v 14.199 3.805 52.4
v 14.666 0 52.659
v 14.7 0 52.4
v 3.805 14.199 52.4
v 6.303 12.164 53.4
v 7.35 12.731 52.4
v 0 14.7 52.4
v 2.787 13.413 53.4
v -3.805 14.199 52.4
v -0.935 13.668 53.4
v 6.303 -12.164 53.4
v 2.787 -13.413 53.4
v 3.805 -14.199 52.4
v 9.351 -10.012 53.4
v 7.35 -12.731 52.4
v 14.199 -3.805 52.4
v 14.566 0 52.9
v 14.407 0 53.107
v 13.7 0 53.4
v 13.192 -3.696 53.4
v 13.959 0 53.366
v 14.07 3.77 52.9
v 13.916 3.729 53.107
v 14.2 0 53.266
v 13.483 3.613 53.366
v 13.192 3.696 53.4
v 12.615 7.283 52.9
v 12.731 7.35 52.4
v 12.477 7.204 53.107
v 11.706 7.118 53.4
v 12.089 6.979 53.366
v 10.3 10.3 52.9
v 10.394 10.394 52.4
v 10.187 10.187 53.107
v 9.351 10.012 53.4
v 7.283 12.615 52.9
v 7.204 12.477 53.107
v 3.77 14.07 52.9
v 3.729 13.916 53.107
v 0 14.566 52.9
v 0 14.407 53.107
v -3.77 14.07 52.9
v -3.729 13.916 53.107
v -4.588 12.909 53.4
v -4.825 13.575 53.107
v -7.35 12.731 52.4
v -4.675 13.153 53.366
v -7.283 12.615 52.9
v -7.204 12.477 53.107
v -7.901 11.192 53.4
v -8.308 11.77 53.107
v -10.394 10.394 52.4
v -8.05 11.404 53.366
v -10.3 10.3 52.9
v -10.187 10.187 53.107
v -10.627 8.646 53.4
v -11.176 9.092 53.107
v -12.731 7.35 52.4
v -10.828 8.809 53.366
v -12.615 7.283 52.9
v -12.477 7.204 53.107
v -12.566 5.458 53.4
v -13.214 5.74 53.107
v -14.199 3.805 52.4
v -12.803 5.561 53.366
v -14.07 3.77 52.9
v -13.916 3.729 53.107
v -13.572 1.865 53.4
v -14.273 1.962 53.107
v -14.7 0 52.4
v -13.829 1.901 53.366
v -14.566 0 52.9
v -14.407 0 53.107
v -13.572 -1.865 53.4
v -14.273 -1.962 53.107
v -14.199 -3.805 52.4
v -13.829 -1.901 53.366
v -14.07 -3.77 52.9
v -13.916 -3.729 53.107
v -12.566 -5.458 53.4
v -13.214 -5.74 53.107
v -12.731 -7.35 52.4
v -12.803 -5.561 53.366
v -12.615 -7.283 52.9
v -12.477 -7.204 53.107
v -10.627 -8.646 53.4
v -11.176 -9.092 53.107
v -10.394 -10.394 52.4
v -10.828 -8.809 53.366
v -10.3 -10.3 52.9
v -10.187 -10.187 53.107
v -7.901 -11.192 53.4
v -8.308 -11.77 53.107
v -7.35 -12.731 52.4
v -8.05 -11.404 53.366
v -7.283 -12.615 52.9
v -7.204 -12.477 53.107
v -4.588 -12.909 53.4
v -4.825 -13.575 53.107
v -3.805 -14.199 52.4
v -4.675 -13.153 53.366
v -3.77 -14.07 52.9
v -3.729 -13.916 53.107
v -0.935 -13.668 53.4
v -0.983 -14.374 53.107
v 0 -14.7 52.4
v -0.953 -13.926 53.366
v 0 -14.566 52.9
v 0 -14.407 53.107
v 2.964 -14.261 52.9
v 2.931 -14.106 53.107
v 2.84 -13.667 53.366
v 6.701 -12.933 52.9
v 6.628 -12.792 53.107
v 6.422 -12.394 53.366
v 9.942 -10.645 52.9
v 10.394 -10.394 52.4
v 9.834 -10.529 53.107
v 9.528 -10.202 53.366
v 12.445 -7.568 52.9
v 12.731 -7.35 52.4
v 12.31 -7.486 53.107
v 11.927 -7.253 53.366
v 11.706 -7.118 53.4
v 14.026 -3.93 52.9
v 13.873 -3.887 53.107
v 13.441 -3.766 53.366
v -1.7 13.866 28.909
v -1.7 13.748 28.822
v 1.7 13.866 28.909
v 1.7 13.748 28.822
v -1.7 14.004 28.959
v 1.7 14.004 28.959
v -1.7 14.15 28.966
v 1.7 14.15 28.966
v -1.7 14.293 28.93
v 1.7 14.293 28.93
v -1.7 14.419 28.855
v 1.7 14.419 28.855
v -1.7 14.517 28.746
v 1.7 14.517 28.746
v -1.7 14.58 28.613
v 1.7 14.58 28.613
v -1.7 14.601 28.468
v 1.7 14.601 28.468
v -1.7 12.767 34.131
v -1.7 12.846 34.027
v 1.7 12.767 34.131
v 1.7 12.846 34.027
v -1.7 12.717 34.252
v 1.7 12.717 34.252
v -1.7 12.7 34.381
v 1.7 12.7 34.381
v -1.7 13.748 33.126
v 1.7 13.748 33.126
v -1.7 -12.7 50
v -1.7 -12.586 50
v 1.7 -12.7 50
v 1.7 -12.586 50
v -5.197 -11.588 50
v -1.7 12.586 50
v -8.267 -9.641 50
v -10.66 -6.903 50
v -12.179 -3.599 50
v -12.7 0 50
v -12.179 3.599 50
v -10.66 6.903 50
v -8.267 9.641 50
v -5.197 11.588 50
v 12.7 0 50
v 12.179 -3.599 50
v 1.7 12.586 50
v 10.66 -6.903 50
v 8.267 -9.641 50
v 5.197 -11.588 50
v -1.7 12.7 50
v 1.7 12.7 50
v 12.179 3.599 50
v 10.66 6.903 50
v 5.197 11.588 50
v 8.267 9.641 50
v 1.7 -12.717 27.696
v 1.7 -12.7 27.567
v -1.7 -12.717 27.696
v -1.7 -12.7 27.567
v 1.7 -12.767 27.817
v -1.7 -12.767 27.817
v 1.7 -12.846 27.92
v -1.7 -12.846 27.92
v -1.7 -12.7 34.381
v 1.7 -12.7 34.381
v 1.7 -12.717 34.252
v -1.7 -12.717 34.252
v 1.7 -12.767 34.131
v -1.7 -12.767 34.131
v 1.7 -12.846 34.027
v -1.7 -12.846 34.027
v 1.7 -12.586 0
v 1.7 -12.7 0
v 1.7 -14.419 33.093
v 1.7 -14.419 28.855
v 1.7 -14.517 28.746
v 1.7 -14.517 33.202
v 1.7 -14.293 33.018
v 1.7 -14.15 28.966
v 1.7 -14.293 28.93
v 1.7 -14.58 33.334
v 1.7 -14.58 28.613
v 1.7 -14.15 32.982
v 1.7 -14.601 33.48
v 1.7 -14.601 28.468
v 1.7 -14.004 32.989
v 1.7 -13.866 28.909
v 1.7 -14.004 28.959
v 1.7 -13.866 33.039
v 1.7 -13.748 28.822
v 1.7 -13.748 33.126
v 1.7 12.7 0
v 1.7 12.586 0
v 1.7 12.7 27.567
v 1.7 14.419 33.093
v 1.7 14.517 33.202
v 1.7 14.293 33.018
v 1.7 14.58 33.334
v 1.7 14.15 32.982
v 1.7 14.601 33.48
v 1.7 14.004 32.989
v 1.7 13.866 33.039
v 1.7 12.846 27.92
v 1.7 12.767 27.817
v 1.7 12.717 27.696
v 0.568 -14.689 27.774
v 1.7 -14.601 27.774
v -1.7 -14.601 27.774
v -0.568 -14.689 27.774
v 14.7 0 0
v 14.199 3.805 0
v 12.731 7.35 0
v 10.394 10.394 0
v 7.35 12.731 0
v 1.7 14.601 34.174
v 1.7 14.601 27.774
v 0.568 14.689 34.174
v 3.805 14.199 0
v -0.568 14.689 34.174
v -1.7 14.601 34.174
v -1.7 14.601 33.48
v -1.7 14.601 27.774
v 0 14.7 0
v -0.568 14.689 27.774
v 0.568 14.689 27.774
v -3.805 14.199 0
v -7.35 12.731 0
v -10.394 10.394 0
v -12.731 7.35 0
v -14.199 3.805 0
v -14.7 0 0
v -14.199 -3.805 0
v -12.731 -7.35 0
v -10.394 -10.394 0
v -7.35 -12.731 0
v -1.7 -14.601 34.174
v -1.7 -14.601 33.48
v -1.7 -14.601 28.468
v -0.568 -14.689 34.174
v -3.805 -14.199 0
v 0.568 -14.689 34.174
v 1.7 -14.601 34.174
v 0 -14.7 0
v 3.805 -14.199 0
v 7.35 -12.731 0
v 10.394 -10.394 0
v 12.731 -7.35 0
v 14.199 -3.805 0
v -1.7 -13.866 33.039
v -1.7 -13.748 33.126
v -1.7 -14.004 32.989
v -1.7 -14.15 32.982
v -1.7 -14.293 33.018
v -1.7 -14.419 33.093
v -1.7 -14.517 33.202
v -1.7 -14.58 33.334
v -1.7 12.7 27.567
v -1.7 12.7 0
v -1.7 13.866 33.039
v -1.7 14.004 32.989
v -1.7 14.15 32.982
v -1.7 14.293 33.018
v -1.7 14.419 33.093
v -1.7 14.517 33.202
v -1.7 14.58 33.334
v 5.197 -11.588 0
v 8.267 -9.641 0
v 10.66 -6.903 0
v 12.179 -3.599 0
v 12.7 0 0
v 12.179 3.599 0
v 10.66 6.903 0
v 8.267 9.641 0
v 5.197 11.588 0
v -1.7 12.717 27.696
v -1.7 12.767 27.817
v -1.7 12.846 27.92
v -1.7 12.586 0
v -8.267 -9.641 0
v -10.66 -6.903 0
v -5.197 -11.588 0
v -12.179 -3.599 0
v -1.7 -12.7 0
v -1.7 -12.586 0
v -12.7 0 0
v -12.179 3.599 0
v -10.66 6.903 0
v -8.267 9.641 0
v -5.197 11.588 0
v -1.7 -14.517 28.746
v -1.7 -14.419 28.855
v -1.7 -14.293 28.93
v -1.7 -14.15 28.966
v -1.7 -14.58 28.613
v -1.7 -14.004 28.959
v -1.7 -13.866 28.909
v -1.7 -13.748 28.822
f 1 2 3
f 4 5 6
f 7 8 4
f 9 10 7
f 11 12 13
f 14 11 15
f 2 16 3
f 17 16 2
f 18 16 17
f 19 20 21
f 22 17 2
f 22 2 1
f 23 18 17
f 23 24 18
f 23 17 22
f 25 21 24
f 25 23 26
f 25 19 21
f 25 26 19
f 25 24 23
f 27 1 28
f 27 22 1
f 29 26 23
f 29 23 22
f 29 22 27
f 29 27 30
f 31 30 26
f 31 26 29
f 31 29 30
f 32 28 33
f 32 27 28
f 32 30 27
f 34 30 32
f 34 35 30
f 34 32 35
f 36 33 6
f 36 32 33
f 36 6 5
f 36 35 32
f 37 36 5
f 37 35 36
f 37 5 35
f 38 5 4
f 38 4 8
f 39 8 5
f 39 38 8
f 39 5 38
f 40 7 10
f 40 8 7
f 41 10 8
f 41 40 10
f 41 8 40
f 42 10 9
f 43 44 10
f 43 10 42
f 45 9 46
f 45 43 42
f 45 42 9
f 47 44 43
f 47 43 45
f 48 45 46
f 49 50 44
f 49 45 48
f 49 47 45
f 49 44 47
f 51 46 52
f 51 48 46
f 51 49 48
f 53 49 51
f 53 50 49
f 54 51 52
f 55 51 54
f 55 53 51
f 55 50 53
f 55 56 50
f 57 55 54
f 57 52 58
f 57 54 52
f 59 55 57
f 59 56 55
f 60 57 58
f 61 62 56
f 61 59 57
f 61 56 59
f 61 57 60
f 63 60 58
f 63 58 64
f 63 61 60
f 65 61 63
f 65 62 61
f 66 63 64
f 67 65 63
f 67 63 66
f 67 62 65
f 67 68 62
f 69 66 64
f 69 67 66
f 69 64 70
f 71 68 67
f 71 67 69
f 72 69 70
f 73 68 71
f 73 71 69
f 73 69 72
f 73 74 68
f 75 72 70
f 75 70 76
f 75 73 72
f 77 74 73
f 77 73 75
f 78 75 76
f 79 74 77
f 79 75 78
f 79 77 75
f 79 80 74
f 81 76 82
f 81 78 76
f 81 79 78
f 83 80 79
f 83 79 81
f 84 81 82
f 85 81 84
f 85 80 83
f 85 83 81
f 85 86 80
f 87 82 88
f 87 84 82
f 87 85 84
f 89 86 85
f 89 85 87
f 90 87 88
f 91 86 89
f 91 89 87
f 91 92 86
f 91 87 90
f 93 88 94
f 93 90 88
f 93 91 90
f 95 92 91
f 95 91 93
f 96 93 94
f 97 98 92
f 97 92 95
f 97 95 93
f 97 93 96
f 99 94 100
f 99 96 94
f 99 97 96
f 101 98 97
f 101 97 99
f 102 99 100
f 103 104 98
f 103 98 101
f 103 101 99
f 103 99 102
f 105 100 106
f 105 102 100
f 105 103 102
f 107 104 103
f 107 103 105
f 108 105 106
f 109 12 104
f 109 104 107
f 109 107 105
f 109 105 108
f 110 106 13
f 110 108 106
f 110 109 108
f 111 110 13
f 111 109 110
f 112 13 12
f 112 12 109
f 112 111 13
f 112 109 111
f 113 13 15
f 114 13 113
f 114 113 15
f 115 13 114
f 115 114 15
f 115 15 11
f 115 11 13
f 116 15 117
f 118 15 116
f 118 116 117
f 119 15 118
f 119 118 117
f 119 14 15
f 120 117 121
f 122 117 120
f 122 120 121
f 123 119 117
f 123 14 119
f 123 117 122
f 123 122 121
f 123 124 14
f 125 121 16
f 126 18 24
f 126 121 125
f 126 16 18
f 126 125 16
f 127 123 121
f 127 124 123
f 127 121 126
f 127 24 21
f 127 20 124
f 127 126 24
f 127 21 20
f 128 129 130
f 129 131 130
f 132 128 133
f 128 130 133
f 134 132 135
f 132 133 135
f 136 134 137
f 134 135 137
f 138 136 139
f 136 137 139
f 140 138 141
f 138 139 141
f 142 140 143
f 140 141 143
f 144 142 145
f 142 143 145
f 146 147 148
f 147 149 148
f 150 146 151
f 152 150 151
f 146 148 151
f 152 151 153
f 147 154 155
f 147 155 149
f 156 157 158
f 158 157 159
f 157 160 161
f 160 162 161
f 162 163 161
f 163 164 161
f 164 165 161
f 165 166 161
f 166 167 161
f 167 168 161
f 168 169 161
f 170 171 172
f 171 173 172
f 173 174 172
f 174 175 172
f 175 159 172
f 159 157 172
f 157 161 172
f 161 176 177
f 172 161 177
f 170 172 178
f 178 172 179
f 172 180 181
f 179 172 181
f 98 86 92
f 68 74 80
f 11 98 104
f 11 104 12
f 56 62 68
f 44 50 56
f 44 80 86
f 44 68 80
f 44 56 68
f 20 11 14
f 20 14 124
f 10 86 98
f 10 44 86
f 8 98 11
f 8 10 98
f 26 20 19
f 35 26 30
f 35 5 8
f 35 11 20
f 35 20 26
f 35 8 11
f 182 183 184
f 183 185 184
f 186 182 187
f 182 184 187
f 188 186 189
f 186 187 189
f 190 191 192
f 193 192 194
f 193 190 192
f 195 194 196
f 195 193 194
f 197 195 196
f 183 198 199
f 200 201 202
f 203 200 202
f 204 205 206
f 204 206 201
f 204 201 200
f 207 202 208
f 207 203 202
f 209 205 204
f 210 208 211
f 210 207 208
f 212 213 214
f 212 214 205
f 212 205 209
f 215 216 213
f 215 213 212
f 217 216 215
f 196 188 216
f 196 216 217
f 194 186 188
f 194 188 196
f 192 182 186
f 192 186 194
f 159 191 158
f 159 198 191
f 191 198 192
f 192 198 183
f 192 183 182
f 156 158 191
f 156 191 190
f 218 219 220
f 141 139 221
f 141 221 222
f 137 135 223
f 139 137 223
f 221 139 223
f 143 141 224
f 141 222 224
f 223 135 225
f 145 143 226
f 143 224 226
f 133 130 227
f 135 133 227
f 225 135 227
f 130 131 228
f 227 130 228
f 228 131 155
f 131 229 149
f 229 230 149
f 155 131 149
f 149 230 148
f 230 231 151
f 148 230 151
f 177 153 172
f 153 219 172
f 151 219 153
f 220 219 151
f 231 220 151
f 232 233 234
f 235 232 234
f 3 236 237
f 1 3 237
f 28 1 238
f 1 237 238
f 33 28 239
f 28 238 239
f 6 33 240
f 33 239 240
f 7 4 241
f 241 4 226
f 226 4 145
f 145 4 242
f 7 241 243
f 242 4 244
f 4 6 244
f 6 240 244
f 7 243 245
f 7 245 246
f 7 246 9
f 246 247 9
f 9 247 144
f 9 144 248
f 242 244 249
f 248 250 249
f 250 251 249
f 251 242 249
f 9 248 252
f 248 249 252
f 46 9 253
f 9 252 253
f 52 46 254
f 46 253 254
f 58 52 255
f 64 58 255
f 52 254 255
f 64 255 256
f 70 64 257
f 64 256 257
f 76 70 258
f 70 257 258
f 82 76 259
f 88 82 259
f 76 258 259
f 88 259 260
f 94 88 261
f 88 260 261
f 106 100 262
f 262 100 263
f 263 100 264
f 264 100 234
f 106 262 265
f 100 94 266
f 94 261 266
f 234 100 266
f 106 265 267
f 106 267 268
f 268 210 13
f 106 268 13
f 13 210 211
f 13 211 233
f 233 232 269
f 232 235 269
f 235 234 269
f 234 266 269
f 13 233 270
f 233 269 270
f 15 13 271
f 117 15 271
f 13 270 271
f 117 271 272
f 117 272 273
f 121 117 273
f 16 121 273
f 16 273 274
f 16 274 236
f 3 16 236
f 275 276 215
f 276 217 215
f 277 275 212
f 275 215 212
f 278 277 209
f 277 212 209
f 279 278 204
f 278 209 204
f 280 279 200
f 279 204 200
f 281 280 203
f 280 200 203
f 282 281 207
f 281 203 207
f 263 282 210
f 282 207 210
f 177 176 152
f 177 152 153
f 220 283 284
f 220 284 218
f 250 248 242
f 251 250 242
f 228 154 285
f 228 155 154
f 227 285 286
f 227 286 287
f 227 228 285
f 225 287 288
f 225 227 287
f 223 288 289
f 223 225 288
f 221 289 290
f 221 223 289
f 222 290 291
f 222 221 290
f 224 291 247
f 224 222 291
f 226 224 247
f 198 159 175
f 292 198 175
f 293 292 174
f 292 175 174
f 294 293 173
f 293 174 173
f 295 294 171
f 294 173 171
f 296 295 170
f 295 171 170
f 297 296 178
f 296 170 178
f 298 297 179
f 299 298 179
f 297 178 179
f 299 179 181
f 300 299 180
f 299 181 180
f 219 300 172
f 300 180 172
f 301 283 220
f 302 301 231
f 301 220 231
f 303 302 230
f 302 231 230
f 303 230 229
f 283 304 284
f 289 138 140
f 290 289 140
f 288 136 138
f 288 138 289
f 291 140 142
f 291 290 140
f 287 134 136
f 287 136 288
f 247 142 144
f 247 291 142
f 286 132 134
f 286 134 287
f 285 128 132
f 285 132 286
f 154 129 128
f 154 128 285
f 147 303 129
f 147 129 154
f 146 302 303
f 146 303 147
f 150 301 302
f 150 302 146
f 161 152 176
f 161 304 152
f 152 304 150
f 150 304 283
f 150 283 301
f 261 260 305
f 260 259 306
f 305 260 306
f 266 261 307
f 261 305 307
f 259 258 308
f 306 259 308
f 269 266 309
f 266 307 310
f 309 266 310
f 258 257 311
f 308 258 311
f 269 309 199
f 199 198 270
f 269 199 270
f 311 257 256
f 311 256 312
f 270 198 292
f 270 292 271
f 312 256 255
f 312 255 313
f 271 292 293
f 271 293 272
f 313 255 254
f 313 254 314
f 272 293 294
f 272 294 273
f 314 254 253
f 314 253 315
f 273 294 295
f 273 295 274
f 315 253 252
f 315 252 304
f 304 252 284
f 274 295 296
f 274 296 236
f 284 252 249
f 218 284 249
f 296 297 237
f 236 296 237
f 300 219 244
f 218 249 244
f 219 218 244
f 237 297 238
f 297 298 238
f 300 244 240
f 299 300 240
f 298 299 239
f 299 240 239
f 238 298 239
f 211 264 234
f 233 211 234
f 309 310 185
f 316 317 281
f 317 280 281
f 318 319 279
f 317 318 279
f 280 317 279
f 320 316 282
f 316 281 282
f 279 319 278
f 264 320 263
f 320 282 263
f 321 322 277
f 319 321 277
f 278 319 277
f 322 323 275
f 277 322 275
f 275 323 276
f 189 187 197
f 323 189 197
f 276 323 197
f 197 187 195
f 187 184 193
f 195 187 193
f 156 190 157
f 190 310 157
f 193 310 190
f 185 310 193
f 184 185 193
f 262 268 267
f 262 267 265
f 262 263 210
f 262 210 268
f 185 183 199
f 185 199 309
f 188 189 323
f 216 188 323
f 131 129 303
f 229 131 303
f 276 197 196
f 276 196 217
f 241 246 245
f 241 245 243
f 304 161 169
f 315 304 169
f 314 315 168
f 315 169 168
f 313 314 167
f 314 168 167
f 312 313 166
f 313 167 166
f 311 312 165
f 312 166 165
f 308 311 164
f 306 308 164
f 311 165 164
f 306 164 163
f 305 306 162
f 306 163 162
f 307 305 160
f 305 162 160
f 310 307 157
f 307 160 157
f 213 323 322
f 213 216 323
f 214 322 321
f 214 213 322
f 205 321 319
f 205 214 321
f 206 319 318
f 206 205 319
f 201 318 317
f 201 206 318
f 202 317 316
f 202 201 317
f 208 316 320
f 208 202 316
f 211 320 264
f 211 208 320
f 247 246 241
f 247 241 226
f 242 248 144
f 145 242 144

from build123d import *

# Parameters (mm, degrees)
SKETCH1_R               = 14.7
BOSS_EXTRUDE1_DEPTH     = 50
CUT_EXTRUDE1_REACH      = 56.15
SKETCH2_R               = 12.7
CUT_EXTRUDE2_REACH      = 60.88
CUT_EXTRUDE2_END_RADIUS = 12.7
SKETCH4_W               = 3.4
SKETCH4_H               = 50
SKETCH5_W               = 3.4
SKETCH5_H               = 6.4
CUT_EXTRUDE3_DEPTH      = 2
BOSS_EXTRUDE2_REACH     = 56.636
SKETCH7_W               = 3.4
SKETCH7_H               = 50
CUT_EXTRUDE4_DEPTH      = 0.114294
SKETCH8_W               = 3.4
SKETCH8_H               = 6.4
CUT_EXTRUDE5_DEPTH      = 2
BOSS_EXTRUDE3_REACH     = 56.636
SKETCH10_R              = 14.7
BOSS_EXTRUDE4_DEPTH     = 3.4
FILLET1_R               = 0.5
FILLET2_R               = 1


with BuildPart() as part:
    # Sketch1 → Boss-Extrude1 (new body)
    with BuildSketch(Plane(origin=(0, 0, 0), x_dir=(0, 1, 0), z_dir=(0, 0, 1))):
        with Locations(Location((0, 0, 0), (0, 0, 270))):
            Circle(SKETCH1_R)
    extrude(amount=BOSS_EXTRUDE1_DEPTH)

    # Sketch2 → Cut-Extrude1 (cut, up to next)
    with BuildSketch(Plane.XY.offset(50), mode=Mode.PRIVATE) as cut_extrude1_sk1:
        Circle(SKETCH2_R)
    cut_extrude1_tool1 = extrude(cut_extrude1_sk1.sketch, amount=-CUT_EXTRUDE1_REACH, mode=Mode.PRIVATE) & part.part
    add(cut_extrude1_tool1.solids().sort_by_distance((0, 0, 50))[0], mode=Mode.SUBTRACT)

    # Cut-Extrude2: up to this cylinder (the profile starts outside it)
    cut_extrude2_end = Plane(origin=(0, 0, 25), z_dir=(0, 0, 1)) * Cylinder(CUT_EXTRUDE2_END_RADIUS, 148.16, mode=Mode.PRIVATE)
    # Sketch4 → Cut-Extrude2 (cut, up to the surface)
    with BuildSketch(Plane(origin=(0, -12.7, 0), x_dir=(-1, 0, 0), z_dir=(0, 1, 0)), mode=Mode.PRIVATE) as cut_extrude2_sk1:
        with Locations((0, 25)):
            Rectangle(SKETCH4_W, SKETCH4_H)
    cut_extrude2_tool1 = extrude(cut_extrude2_sk1.sketch, amount=CUT_EXTRUDE2_REACH, mode=Mode.PRIVATE) - cut_extrude2_end
    add(cut_extrude2_tool1.solids().sort_by_distance((0, -12.7, 25))[0], mode=Mode.SUBTRACT)
    add(cut_extrude2_tool1.solids().sort_by_distance((0, -12.7, 25))[1], mode=Mode.SUBTRACT)

    # Sketch5 → Cut-Extrude3 (cut)
    with BuildSketch(Plane(origin=(0, -12.7, 0), x_dir=(-1, 0, 0), z_dir=(0, 1, 0))):
        with Locations((0, 30.973847717)):
            Rectangle(SKETCH5_W, SKETCH5_H)
    extrude(amount=-CUT_EXTRUDE3_DEPTH, mode=Mode.SUBTRACT)

    # Sketch6 → Boss-Extrude2 (add, up to next)
    with BuildSketch(Plane.YZ.offset(-1.7), mode=Mode.PRIVATE) as boss_extrude2_sk1:
        Polygon((-14.601369799, 27.773847717), (-12.7, 27.773847717), (-14.601369799, 29.675217516), align=None)
    boss_extrude2_tool1 = extrude(boss_extrude2_sk1.sketch, amount=BOSS_EXTRUDE2_REACH, mode=Mode.PRIVATE) - part.part
    # Sketch6 → Boss-Extrude2 (add, up to next)
    with BuildSketch(Plane.YZ.offset(-1.7), mode=Mode.PRIVATE) as boss_extrude2_sk2:
        Polygon((-14.601369799, 34.173847717), (-12.7, 34.173847717), (-14.601369799, 32.272477918), align=None)
    boss_extrude2_tool2 = extrude(boss_extrude2_sk2.sketch, amount=BOSS_EXTRUDE2_REACH, mode=Mode.PRIVATE) - part.part
    add(boss_extrude2_tool1.solids().sort_by_distance((-1.7, -13.96758, 28.407638))[0])
    add(boss_extrude2_tool2.solids().sort_by_distance((-1.7, -13.96758, 33.540058))[0])

    # Sketch7 → Cut-Extrude4 (cut)
    with BuildSketch(Plane.XZ.offset(-12.7)):
        with Locations((0, 25)):
            Rectangle(SKETCH7_W, SKETCH7_H)
    extrude(amount=CUT_EXTRUDE4_DEPTH, mode=Mode.SUBTRACT)

    # Sketch8 → Cut-Extrude5 (cut)
    with BuildSketch(Plane.XZ.offset(-12.7)):
        with Locations((0, 30.973847717)):
            Rectangle(SKETCH8_W, SKETCH8_H)
    extrude(amount=-CUT_EXTRUDE5_DEPTH, mode=Mode.SUBTRACT)

    # Sketch9 → Boss-Extrude3 (add, up to next)
    with BuildSketch(Plane.YZ.offset(-1.7), mode=Mode.PRIVATE) as boss_extrude3_sk1:
        Polygon((14.601369799, 34.173847717), (14.601369799, 32.272477918), (12.7, 34.173847717), align=None)
    boss_extrude3_tool1 = extrude(boss_extrude3_sk1.sketch, amount=BOSS_EXTRUDE3_REACH, mode=Mode.PRIVATE) - part.part
    # Sketch9 → Boss-Extrude3 (add, up to next)
    with BuildSketch(Plane.YZ.offset(-1.7), mode=Mode.PRIVATE) as boss_extrude3_sk2:
        Polygon((14.601369799, 27.773847717), (14.601369799, 29.675217516), (12.7, 27.773847717), align=None)
    boss_extrude3_tool2 = extrude(boss_extrude3_sk2.sketch, amount=BOSS_EXTRUDE3_REACH, mode=Mode.PRIVATE) - part.part
    add(boss_extrude3_tool1.solids().sort_by_distance((-1.7, 13.96758, 33.540058))[0])
    add(boss_extrude3_tool2.solids().sort_by_distance((-1.7, 13.96758, 28.407638))[0])

    # Sketch10 → Boss-Extrude4 (add)
    with BuildSketch(Plane.XY.offset(50)):
        Circle(SKETCH10_R)
    extrude(amount=BOSS_EXTRUDE4_DEPTH)

    # Fillet1
    fillet1_edges = [part.edges().sort_by_distance(p)[0] for p in [
        (0, 12.7, 27.773847717),
        (0, 12.7, 34.173847717),
        (0, 14.601369799, 32.272477918),
        (0, 14.601369799, 29.675217516),
        (0, -12.7, 27.773847717),
        (0, -12.7, 34.173847717),
        (0, -14.601369799, 29.675217516),
        (0, -14.601369799, 32.272477918),
    ]]
    fillet(fillet1_edges, radius=FILLET1_R)

    # Fillet2
    fillet2_edges = [part.edges().sort_by_distance(p)[0] for p in [
        (-14.7, 0, 53.4),
    ]]
    fillet(fillet2_edges, radius=FILLET2_R)


solid = part.part
